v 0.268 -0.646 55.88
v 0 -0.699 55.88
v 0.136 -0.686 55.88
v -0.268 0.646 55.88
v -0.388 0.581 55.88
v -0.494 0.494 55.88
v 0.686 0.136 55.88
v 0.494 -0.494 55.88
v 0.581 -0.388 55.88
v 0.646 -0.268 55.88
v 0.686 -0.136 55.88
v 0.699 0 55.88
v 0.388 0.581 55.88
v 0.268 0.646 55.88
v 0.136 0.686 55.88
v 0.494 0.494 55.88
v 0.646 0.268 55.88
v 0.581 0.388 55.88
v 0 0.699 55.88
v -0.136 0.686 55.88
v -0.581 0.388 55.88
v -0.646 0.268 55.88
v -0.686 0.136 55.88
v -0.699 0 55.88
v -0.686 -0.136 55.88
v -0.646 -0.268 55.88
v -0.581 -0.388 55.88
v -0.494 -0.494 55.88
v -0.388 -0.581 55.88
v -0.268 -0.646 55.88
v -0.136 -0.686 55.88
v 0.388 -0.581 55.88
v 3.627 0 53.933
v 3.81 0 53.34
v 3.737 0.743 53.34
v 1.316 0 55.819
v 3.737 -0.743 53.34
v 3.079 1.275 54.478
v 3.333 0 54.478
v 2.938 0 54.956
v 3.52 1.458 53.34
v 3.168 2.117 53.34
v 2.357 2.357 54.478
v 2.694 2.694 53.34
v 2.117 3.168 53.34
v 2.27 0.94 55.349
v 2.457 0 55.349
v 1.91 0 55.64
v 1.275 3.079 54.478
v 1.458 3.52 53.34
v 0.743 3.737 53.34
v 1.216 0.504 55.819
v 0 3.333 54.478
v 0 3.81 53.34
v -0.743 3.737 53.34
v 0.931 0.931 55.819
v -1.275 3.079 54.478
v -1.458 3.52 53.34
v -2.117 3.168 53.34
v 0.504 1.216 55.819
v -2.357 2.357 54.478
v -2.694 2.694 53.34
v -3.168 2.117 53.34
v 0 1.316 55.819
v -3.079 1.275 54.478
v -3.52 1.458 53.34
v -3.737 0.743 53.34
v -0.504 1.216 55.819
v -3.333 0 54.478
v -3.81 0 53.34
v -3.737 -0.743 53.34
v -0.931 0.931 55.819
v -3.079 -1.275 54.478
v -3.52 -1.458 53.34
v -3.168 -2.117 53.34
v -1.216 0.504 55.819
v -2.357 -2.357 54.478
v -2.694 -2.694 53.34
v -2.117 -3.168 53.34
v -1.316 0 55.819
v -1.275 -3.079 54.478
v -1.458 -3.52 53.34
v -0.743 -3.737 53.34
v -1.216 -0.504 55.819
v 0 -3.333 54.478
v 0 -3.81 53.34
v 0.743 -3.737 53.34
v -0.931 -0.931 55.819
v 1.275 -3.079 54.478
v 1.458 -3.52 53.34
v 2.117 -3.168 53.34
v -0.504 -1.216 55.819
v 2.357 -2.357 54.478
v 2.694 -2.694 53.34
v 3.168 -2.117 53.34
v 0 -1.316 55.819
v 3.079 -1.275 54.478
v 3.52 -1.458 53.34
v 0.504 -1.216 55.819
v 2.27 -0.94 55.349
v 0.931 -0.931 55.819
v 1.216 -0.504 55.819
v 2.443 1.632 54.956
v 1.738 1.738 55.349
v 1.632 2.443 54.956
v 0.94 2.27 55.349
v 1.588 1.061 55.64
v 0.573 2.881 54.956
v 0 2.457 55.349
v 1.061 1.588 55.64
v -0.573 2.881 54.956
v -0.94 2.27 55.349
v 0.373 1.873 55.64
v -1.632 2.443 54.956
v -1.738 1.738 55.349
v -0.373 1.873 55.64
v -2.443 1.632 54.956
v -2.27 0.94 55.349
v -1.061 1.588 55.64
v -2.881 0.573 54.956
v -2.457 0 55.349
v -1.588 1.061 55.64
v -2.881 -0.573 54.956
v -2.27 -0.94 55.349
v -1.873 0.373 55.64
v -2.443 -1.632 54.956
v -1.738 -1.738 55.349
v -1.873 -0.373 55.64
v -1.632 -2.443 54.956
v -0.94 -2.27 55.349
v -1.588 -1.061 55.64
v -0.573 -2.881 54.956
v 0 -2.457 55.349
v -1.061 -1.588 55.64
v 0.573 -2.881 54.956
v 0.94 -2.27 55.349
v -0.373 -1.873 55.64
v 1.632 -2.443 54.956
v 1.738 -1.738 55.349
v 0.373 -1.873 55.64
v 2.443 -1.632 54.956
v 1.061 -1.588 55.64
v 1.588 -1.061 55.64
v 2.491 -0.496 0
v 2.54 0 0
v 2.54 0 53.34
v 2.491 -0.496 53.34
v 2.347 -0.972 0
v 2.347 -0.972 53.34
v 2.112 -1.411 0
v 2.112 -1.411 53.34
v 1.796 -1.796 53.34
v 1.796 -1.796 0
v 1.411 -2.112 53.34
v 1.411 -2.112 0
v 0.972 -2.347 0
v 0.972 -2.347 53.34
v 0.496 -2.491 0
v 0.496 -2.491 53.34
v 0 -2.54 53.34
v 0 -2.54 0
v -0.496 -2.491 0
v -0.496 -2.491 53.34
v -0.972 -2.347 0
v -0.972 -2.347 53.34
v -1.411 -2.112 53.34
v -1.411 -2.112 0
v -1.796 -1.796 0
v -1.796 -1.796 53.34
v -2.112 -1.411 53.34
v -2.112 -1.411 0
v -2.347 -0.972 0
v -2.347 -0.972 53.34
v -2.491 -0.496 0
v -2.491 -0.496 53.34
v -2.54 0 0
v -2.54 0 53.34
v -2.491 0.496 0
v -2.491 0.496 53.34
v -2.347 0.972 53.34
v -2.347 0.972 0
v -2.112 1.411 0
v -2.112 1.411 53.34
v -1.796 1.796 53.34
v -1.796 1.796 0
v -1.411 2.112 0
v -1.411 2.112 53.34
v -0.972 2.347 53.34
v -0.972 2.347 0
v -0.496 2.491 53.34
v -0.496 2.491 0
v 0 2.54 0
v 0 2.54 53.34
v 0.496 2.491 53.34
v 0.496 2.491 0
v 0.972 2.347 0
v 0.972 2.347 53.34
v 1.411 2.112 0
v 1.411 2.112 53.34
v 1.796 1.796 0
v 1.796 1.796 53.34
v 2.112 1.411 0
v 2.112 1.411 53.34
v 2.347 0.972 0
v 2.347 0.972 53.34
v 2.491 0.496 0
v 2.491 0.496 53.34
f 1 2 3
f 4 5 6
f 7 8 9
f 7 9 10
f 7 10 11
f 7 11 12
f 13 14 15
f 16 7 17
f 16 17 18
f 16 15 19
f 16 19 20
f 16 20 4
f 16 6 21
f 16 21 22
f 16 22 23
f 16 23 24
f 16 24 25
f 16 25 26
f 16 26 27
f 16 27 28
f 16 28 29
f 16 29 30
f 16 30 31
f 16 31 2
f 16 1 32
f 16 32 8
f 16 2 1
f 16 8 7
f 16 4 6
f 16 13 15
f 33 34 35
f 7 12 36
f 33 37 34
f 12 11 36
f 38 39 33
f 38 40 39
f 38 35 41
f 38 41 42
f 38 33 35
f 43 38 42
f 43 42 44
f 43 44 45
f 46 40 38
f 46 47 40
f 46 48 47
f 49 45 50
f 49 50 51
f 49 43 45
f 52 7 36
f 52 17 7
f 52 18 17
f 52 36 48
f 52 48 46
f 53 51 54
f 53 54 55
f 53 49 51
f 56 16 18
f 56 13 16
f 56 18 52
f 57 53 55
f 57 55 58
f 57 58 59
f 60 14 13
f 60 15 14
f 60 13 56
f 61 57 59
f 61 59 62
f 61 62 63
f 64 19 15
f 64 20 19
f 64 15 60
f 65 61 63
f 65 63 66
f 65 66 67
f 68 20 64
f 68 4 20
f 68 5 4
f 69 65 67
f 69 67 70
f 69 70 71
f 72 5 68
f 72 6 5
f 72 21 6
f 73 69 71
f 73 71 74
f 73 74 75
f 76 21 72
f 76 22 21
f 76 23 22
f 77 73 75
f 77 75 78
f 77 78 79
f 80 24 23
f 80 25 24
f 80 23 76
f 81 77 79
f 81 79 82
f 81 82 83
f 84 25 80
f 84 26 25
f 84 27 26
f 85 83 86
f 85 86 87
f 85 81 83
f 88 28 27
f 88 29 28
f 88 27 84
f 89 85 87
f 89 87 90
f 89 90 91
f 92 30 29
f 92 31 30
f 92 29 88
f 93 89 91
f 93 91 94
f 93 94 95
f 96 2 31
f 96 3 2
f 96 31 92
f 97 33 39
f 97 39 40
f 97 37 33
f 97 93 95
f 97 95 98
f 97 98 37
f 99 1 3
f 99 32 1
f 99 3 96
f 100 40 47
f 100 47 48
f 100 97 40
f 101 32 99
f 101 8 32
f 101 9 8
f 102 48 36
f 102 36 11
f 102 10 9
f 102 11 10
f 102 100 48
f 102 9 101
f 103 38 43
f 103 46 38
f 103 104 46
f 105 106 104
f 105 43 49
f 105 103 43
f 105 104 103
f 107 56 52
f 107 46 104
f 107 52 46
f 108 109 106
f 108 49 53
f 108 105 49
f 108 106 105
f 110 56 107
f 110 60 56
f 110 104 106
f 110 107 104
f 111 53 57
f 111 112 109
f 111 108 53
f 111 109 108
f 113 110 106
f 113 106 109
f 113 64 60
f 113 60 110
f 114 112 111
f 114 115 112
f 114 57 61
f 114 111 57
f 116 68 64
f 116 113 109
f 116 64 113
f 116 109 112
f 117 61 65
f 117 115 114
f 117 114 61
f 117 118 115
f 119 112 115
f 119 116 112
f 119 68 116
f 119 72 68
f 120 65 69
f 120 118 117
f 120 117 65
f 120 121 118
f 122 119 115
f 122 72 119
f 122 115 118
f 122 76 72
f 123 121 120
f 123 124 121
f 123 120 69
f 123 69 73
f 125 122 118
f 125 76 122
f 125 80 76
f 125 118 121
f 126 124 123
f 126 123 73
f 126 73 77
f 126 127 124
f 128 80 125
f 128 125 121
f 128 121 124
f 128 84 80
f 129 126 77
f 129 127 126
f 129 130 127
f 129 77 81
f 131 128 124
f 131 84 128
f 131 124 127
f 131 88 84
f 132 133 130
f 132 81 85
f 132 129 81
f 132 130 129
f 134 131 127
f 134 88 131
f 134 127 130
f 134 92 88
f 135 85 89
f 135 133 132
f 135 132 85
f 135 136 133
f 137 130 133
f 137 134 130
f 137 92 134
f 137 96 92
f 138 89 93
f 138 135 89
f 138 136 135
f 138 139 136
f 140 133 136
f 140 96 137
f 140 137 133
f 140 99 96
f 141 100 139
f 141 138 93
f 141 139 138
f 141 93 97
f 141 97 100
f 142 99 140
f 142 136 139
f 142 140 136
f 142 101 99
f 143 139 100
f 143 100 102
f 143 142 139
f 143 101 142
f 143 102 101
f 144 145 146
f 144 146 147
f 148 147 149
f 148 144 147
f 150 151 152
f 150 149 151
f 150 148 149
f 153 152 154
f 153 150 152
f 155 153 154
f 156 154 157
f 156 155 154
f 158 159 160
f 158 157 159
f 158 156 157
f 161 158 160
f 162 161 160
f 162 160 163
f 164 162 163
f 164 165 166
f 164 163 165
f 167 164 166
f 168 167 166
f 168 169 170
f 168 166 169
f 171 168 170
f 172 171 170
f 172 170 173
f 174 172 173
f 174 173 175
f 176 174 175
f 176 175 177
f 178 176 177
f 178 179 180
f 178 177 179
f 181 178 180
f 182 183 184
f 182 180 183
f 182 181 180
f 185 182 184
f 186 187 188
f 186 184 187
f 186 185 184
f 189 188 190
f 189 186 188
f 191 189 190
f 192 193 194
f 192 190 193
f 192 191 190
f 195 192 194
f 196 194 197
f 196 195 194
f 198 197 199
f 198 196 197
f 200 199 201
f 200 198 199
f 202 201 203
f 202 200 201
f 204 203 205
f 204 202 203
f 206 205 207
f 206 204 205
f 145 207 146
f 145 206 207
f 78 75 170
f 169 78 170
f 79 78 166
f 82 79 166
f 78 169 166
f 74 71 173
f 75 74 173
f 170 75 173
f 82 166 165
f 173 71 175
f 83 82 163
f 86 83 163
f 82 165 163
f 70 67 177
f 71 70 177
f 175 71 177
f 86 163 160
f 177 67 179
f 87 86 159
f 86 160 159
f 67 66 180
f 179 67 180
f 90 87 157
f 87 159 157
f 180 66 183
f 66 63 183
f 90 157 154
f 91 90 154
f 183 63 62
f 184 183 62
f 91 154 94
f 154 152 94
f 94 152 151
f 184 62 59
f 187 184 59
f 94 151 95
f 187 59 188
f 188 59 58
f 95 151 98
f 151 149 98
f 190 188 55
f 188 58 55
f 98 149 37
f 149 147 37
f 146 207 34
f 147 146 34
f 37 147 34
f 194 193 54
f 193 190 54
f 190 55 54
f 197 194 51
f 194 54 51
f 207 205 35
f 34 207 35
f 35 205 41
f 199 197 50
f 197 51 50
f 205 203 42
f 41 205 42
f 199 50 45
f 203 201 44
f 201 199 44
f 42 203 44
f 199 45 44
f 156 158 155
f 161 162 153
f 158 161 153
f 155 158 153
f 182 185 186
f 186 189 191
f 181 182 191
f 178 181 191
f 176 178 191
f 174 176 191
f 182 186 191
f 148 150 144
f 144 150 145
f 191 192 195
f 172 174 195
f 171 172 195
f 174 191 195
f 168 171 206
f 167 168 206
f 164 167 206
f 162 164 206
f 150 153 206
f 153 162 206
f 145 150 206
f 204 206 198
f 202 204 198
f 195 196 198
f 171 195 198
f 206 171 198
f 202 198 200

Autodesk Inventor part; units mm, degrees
ref_plane "YZ Plane" through (0, 0, 0) normal (1, 0, 0) x (0, 1, 0)
ref_plane "XZ Plane" through (0, 0, 0) normal (0, 1, 0) x (-1, 0, 0)
ref_plane "XY Plane" through (0, 0, 0) normal (0, 0, 1) x (1, 0, 0)
sketch "Sketch1" plane through (0, 0, 0) normal (0, 0, 1) x (1, 0, 0)
  circle A0 centre (0, 0) radius 2.54
  dimension "d0" = 5.08
extrude "Extrusion1" add sketch "Sketch1" along normal blind 53.34
sketch "Sketch2" plane through (0, 0, 53.34) normal (0, 0, 1) x (1, 0, 0)
  circle A0 centre (0, 0) radius 2.54 projected
  circle A1 centre (0, 0) radius 3.81
  dimension "d3" = 7.62
extrude "Extrusion2" add sketch "Sketch2" along normal blind 2.54 contours A0 | A1
fillet "Fillet1" radius 3.175 1 edges at (-3.81, 0, 55.88)
properties part number "HingeBolt"
